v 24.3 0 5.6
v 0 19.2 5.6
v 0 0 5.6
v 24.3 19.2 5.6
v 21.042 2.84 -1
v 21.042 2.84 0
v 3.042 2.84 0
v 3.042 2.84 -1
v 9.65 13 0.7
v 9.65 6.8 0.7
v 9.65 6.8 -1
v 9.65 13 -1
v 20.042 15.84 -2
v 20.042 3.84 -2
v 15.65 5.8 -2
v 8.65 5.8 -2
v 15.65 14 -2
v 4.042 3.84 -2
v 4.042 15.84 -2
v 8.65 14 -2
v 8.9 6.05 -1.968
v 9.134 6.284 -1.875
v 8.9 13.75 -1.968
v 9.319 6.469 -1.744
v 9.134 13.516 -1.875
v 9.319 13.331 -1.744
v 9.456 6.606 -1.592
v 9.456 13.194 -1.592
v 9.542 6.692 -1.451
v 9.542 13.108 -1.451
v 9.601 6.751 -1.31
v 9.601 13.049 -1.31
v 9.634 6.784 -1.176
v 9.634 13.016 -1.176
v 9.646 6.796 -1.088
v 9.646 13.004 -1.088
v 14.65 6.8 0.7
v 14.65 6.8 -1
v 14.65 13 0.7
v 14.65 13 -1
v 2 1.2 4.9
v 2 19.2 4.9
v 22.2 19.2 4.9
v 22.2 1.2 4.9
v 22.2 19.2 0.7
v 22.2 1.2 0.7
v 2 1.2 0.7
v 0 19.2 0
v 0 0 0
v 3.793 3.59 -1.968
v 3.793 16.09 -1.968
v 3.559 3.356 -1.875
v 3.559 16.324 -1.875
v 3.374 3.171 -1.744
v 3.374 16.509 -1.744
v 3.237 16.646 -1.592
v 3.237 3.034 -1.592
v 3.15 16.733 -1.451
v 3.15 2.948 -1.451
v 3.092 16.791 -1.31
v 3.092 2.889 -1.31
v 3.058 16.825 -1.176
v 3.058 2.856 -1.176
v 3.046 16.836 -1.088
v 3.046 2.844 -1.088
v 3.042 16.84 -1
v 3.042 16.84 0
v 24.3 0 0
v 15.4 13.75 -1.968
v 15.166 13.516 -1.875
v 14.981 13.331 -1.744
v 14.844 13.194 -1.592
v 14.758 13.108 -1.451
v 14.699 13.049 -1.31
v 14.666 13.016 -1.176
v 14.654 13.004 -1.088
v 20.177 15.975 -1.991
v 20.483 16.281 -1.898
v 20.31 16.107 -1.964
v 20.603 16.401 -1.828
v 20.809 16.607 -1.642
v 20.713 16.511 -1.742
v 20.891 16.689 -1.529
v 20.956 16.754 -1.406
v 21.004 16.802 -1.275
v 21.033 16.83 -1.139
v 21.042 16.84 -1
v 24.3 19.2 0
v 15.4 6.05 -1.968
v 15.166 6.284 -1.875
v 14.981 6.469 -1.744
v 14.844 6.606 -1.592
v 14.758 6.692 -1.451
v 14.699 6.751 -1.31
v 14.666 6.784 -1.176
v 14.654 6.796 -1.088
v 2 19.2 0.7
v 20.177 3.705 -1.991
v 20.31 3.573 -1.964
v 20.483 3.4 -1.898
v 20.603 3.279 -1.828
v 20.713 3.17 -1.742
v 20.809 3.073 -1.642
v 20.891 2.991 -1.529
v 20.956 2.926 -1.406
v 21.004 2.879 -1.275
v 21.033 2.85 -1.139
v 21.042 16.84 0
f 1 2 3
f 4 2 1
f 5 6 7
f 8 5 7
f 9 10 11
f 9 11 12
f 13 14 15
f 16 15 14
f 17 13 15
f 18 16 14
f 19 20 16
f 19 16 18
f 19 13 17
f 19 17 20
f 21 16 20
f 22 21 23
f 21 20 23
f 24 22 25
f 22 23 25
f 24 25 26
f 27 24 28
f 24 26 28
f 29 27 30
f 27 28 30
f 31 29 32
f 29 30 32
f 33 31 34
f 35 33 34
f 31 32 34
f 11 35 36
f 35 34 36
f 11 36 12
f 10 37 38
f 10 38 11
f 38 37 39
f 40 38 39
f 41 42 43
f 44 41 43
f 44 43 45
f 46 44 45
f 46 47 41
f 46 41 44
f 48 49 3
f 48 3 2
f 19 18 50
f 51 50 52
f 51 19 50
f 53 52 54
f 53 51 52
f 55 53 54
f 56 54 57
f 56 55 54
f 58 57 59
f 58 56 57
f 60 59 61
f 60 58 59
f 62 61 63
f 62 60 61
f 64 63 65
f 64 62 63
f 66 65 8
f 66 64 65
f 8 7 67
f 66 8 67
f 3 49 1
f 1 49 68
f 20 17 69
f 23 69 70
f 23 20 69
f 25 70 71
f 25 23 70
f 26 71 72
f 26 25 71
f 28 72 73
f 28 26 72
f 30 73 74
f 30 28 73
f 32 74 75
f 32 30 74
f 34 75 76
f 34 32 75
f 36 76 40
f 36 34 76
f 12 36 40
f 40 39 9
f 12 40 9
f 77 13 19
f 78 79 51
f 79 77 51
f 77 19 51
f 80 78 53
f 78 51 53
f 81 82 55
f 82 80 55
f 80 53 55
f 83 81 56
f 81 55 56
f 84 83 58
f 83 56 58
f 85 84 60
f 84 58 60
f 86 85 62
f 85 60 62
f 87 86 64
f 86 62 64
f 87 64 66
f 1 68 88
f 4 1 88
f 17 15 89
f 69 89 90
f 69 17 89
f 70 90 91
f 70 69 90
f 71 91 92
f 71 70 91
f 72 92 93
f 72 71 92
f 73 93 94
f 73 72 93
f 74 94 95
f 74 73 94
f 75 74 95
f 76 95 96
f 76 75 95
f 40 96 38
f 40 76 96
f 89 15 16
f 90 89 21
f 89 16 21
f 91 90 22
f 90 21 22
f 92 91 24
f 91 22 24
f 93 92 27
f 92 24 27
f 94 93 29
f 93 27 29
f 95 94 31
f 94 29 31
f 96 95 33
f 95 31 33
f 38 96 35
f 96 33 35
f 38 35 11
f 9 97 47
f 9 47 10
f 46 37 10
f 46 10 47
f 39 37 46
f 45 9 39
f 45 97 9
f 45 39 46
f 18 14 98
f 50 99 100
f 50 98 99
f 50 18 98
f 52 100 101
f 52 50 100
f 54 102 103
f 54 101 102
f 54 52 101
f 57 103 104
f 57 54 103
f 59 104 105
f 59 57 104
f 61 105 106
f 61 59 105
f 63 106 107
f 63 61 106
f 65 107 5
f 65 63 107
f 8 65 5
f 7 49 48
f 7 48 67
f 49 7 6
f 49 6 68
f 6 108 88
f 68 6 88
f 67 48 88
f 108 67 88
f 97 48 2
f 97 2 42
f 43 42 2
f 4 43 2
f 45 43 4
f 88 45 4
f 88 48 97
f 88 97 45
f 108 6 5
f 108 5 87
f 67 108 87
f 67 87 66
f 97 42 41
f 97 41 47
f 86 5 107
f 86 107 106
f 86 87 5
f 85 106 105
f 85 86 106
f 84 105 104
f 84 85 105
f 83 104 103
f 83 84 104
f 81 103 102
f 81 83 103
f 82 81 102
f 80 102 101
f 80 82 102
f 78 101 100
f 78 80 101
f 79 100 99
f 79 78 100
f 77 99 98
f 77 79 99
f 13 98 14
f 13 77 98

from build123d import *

# Parameters (mm, degrees)
CROQUIS1_W              = 24.3
CROQUIS1_H              = 19.2
SALIENTE_EXTRUIR1_DEPTH = 5.6
CROQUIS2_W              = 20.2
CROQUIS2_H              = 4.2
CORTAR_EXTRUIR1_DEPTH   = 18
CROQUIS3_W              = 5
CROQUIS3_H              = 6.2
CORTAR_EXTRUIR2_DEPTH   = 2
CROQUIS5_W              = 18
CROQUIS5_H              = 14
CROQUIS5_W_2            = 5
CROQUIS5_H_2            = 6.2
SALIENTE_EXTRUIR3_DEPTH = 2
REDONDEO1_R             = 1


with BuildPart() as part:
    # Croquis1 → Saliente-Extruir1 (new body)
    with BuildSketch(Plane.XY):
        with Locations((12.15, 9.6)):
            Rectangle(CROQUIS1_W, CROQUIS1_H)
    extrude(amount=SALIENTE_EXTRUIR1_DEPTH)

    # Croquis2 → Cortar-Extruir1 (cut)
    with BuildSketch(Plane(origin=(0, 19.2, 0), x_dir=(1, 0, 0), z_dir=(0, 1, 0))):
        with Locations((12.1, -2.8)):
            Rectangle(CROQUIS2_W, CROQUIS2_H)
    extrude(amount=-CORTAR_EXTRUIR1_DEPTH, mode=Mode.SUBTRACT)

    # Croquis3 → Cortar-Extruir2 (cut)
    with BuildSketch(Plane(origin=(0, 0, 0), x_dir=(-1, 0, 0), z_dir=(0, 0, -1))):
        with Locations((-12.15, 9.9)):
            Rectangle(CROQUIS3_W, CROQUIS3_H)
    extrude(amount=-CORTAR_EXTRUIR2_DEPTH, mode=Mode.SUBTRACT)

    # Croquis5 → Saliente-Extruir3 (add)
    with BuildSketch(Plane(origin=(0, 0, 0), x_dir=(-1, 0, 0), z_dir=(0, 0, -1))):
        with Locations((-12.042477661, 9.840107479)):
            Rectangle(CROQUIS5_W, CROQUIS5_H)
        with Locations((-12.15, 9.9)):
            Rectangle(CROQUIS5_W_2, CROQUIS5_H_2, mode=Mode.SUBTRACT)
    extrude(amount=SALIENTE_EXTRUIR3_DEPTH)

    # Redondeo1
    redondeo1_edges = [part.edges().sort_by_distance(p)[0] for p in [
        (21.042477661, 9.840107479, -2),
        (12.042477661, 2.840107479, -2),
        (3.042477661, 9.840107479, -2),
        (12.042477661, 16.840107479, -2),
        (14.65, 9.9, -2),
        (12.15, 6.8, -2),
        (9.65, 9.9, -2),
        (12.15, 13, -2),
    ]]
    fillet(redondeo1_edges, radius=REDONDEO1_R)


solid = part.part
